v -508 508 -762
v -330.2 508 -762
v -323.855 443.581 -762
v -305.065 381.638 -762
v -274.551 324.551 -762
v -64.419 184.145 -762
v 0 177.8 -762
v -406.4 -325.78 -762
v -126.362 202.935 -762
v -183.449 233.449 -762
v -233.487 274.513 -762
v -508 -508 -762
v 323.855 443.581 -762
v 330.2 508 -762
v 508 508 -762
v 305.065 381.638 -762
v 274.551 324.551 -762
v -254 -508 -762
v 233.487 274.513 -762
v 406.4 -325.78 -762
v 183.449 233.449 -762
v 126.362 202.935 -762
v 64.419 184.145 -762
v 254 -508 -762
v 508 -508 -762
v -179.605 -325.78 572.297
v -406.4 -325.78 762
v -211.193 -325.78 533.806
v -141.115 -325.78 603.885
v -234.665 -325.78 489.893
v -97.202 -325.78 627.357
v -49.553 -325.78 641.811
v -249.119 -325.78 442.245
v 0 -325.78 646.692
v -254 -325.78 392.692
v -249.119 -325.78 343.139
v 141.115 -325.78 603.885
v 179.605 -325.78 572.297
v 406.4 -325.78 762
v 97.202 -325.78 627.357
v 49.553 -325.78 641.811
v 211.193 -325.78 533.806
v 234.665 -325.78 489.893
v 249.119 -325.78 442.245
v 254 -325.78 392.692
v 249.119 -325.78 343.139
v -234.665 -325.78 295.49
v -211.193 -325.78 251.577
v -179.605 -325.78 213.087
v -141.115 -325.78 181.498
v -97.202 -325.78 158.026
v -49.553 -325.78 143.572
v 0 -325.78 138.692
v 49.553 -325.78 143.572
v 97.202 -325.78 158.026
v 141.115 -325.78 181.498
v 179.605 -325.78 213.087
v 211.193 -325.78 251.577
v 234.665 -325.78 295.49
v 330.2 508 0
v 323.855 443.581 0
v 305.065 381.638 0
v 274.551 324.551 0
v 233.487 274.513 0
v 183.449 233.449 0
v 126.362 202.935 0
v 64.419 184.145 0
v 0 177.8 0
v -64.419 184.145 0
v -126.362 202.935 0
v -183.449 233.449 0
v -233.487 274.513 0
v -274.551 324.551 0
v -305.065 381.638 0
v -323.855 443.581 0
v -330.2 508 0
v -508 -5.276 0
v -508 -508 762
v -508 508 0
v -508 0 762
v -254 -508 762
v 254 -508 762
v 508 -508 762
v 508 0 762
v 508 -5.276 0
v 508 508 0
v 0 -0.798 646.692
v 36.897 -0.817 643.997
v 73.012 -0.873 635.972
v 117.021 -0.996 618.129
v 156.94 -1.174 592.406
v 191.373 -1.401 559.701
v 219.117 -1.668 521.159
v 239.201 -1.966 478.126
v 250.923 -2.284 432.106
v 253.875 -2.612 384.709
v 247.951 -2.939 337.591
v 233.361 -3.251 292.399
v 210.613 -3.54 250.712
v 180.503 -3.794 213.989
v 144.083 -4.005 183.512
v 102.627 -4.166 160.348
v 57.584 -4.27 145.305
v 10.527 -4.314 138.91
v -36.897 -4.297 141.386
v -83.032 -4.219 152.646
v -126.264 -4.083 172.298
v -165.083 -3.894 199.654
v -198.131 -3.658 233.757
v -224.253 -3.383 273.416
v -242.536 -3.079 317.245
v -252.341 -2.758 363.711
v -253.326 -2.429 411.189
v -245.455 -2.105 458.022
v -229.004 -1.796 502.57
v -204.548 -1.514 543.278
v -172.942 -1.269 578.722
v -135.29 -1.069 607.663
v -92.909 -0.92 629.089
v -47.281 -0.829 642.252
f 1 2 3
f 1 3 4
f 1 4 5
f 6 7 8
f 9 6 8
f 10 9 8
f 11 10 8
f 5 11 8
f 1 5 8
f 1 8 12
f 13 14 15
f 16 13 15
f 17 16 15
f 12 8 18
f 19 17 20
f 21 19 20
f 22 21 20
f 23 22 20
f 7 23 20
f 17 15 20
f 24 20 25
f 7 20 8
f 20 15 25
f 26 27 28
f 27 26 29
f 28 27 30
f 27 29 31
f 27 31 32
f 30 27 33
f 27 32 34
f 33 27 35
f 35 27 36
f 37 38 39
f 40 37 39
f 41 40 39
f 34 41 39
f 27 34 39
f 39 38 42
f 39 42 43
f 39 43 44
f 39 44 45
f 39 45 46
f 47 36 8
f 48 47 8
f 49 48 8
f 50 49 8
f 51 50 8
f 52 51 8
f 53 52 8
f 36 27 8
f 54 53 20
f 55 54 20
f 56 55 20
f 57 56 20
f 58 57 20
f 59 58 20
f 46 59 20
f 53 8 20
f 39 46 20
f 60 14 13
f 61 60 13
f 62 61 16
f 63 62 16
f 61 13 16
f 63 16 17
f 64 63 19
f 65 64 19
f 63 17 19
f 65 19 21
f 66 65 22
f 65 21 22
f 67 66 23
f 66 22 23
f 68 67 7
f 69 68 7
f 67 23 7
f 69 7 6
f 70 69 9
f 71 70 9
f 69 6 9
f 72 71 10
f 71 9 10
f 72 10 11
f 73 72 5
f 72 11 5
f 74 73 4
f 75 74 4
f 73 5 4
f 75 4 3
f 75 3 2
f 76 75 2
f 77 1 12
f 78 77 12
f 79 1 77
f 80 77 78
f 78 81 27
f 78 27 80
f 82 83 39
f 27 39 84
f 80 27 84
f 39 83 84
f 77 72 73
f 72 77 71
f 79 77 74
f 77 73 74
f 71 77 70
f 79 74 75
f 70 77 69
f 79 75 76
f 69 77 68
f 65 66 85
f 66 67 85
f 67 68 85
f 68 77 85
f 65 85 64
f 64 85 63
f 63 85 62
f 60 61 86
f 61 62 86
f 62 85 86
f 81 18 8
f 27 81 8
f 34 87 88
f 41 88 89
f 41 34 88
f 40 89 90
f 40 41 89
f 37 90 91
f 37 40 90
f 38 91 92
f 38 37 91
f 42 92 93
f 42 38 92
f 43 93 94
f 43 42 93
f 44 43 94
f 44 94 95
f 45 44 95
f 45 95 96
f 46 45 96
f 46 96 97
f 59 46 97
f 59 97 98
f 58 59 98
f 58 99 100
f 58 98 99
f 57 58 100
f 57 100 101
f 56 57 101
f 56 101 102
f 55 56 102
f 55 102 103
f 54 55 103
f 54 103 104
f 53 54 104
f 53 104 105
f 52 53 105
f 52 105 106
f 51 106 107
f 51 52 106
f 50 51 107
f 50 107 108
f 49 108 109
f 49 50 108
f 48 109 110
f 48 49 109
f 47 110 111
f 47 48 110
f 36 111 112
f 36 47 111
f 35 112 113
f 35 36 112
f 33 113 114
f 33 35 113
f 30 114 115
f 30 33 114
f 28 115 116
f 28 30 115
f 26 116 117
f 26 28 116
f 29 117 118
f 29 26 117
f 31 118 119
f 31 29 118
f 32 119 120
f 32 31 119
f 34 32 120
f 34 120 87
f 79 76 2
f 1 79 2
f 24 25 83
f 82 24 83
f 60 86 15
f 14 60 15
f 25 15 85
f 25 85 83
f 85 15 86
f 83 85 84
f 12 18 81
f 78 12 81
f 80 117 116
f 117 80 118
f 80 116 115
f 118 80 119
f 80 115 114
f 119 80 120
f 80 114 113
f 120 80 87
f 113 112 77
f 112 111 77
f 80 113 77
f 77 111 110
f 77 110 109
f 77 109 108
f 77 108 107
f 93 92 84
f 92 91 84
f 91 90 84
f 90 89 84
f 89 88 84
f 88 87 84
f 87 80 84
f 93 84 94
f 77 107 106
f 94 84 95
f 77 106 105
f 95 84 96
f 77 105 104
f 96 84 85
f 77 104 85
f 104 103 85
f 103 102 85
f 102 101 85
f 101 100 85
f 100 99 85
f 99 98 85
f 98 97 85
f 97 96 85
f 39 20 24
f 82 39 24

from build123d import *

# Parameters (mm, degrees)
EXTRUDE_1_DEPTH          = 508
CUT_EXTRUDE_1_DEPTH      = 1048.268828907
CUT_EXTRUDE_1_DEPTH_BACK = 1048.268828907
CUT_EXTRUDE_2_DEPTH      = 1048.268828907
CUT_EXTRUDE_2_DEPTH_BACK = 1048.268828907
CUT_EXTRUDE_3_DEPTH      = 1048.268828907
CUT_EXTRUDE_3_DEPTH_BACK = 1048.268828907
SKETCH_5_R               = 254


with BuildPart() as part:
    # 草图2 → 凸台-拉伸1 (new, symmetric)
    with BuildSketch(Plane(origin=(0, 0, 0), x_dir=(0, 0, -1), z_dir=(1, 0, 0))):
        Polygon((0, 508), (762, 508), (762, -508), (-762, -508), (-762, 0), (0, -5.276054191), align=None)
    extrude(amount=EXTRUDE_1_DEPTH, both=True)

    # 草图3 → 切除-拉伸1 (cut, two sides: drawn at the far end of the back side and taken through both)
    with BuildSketch(Plane.XY.offset(-CUT_EXTRUDE_1_DEPTH_BACK)):
        with BuildLine():
            Line((-330.2, 508), (330.2, 508))
            ThreePointArc((330.2, 508), (0, 177.8), (-330.2, 508))
        make_face()
    extrude(amount=CUT_EXTRUDE_1_DEPTH + CUT_EXTRUDE_1_DEPTH_BACK, mode=Mode.SUBTRACT)

    # 草图4 → 切除-拉伸2 (cut, two sides: drawn at the far end of the back side and taken through both)
    with BuildSketch(Plane.XY.offset(-CUT_EXTRUDE_2_DEPTH_BACK)):
        Polygon((-406.4, -325.779762396), (406.4, -325.779762396), (254, -508), (-254, -508), align=None)
    extrude(amount=CUT_EXTRUDE_2_DEPTH + CUT_EXTRUDE_2_DEPTH_BACK, mode=Mode.SUBTRACT)

    # 草图5 → 切除-拉伸3 (cut, two sides: drawn at the far end of the back side and taken through both)
    with BuildSketch(Plane(origin=(0, 0, 0), x_dir=(1, 0, 0), z_dir=(0, 1, 0)).offset(-CUT_EXTRUDE_3_DEPTH_BACK)):
        with Locations(Location((0, -392.691654486, 0), (0, 0, 270))):
            Circle(SKETCH_5_R)
    extrude(amount=CUT_EXTRUDE_3_DEPTH + CUT_EXTRUDE_3_DEPTH_BACK, mode=Mode.SUBTRACT)


solid = part.part
